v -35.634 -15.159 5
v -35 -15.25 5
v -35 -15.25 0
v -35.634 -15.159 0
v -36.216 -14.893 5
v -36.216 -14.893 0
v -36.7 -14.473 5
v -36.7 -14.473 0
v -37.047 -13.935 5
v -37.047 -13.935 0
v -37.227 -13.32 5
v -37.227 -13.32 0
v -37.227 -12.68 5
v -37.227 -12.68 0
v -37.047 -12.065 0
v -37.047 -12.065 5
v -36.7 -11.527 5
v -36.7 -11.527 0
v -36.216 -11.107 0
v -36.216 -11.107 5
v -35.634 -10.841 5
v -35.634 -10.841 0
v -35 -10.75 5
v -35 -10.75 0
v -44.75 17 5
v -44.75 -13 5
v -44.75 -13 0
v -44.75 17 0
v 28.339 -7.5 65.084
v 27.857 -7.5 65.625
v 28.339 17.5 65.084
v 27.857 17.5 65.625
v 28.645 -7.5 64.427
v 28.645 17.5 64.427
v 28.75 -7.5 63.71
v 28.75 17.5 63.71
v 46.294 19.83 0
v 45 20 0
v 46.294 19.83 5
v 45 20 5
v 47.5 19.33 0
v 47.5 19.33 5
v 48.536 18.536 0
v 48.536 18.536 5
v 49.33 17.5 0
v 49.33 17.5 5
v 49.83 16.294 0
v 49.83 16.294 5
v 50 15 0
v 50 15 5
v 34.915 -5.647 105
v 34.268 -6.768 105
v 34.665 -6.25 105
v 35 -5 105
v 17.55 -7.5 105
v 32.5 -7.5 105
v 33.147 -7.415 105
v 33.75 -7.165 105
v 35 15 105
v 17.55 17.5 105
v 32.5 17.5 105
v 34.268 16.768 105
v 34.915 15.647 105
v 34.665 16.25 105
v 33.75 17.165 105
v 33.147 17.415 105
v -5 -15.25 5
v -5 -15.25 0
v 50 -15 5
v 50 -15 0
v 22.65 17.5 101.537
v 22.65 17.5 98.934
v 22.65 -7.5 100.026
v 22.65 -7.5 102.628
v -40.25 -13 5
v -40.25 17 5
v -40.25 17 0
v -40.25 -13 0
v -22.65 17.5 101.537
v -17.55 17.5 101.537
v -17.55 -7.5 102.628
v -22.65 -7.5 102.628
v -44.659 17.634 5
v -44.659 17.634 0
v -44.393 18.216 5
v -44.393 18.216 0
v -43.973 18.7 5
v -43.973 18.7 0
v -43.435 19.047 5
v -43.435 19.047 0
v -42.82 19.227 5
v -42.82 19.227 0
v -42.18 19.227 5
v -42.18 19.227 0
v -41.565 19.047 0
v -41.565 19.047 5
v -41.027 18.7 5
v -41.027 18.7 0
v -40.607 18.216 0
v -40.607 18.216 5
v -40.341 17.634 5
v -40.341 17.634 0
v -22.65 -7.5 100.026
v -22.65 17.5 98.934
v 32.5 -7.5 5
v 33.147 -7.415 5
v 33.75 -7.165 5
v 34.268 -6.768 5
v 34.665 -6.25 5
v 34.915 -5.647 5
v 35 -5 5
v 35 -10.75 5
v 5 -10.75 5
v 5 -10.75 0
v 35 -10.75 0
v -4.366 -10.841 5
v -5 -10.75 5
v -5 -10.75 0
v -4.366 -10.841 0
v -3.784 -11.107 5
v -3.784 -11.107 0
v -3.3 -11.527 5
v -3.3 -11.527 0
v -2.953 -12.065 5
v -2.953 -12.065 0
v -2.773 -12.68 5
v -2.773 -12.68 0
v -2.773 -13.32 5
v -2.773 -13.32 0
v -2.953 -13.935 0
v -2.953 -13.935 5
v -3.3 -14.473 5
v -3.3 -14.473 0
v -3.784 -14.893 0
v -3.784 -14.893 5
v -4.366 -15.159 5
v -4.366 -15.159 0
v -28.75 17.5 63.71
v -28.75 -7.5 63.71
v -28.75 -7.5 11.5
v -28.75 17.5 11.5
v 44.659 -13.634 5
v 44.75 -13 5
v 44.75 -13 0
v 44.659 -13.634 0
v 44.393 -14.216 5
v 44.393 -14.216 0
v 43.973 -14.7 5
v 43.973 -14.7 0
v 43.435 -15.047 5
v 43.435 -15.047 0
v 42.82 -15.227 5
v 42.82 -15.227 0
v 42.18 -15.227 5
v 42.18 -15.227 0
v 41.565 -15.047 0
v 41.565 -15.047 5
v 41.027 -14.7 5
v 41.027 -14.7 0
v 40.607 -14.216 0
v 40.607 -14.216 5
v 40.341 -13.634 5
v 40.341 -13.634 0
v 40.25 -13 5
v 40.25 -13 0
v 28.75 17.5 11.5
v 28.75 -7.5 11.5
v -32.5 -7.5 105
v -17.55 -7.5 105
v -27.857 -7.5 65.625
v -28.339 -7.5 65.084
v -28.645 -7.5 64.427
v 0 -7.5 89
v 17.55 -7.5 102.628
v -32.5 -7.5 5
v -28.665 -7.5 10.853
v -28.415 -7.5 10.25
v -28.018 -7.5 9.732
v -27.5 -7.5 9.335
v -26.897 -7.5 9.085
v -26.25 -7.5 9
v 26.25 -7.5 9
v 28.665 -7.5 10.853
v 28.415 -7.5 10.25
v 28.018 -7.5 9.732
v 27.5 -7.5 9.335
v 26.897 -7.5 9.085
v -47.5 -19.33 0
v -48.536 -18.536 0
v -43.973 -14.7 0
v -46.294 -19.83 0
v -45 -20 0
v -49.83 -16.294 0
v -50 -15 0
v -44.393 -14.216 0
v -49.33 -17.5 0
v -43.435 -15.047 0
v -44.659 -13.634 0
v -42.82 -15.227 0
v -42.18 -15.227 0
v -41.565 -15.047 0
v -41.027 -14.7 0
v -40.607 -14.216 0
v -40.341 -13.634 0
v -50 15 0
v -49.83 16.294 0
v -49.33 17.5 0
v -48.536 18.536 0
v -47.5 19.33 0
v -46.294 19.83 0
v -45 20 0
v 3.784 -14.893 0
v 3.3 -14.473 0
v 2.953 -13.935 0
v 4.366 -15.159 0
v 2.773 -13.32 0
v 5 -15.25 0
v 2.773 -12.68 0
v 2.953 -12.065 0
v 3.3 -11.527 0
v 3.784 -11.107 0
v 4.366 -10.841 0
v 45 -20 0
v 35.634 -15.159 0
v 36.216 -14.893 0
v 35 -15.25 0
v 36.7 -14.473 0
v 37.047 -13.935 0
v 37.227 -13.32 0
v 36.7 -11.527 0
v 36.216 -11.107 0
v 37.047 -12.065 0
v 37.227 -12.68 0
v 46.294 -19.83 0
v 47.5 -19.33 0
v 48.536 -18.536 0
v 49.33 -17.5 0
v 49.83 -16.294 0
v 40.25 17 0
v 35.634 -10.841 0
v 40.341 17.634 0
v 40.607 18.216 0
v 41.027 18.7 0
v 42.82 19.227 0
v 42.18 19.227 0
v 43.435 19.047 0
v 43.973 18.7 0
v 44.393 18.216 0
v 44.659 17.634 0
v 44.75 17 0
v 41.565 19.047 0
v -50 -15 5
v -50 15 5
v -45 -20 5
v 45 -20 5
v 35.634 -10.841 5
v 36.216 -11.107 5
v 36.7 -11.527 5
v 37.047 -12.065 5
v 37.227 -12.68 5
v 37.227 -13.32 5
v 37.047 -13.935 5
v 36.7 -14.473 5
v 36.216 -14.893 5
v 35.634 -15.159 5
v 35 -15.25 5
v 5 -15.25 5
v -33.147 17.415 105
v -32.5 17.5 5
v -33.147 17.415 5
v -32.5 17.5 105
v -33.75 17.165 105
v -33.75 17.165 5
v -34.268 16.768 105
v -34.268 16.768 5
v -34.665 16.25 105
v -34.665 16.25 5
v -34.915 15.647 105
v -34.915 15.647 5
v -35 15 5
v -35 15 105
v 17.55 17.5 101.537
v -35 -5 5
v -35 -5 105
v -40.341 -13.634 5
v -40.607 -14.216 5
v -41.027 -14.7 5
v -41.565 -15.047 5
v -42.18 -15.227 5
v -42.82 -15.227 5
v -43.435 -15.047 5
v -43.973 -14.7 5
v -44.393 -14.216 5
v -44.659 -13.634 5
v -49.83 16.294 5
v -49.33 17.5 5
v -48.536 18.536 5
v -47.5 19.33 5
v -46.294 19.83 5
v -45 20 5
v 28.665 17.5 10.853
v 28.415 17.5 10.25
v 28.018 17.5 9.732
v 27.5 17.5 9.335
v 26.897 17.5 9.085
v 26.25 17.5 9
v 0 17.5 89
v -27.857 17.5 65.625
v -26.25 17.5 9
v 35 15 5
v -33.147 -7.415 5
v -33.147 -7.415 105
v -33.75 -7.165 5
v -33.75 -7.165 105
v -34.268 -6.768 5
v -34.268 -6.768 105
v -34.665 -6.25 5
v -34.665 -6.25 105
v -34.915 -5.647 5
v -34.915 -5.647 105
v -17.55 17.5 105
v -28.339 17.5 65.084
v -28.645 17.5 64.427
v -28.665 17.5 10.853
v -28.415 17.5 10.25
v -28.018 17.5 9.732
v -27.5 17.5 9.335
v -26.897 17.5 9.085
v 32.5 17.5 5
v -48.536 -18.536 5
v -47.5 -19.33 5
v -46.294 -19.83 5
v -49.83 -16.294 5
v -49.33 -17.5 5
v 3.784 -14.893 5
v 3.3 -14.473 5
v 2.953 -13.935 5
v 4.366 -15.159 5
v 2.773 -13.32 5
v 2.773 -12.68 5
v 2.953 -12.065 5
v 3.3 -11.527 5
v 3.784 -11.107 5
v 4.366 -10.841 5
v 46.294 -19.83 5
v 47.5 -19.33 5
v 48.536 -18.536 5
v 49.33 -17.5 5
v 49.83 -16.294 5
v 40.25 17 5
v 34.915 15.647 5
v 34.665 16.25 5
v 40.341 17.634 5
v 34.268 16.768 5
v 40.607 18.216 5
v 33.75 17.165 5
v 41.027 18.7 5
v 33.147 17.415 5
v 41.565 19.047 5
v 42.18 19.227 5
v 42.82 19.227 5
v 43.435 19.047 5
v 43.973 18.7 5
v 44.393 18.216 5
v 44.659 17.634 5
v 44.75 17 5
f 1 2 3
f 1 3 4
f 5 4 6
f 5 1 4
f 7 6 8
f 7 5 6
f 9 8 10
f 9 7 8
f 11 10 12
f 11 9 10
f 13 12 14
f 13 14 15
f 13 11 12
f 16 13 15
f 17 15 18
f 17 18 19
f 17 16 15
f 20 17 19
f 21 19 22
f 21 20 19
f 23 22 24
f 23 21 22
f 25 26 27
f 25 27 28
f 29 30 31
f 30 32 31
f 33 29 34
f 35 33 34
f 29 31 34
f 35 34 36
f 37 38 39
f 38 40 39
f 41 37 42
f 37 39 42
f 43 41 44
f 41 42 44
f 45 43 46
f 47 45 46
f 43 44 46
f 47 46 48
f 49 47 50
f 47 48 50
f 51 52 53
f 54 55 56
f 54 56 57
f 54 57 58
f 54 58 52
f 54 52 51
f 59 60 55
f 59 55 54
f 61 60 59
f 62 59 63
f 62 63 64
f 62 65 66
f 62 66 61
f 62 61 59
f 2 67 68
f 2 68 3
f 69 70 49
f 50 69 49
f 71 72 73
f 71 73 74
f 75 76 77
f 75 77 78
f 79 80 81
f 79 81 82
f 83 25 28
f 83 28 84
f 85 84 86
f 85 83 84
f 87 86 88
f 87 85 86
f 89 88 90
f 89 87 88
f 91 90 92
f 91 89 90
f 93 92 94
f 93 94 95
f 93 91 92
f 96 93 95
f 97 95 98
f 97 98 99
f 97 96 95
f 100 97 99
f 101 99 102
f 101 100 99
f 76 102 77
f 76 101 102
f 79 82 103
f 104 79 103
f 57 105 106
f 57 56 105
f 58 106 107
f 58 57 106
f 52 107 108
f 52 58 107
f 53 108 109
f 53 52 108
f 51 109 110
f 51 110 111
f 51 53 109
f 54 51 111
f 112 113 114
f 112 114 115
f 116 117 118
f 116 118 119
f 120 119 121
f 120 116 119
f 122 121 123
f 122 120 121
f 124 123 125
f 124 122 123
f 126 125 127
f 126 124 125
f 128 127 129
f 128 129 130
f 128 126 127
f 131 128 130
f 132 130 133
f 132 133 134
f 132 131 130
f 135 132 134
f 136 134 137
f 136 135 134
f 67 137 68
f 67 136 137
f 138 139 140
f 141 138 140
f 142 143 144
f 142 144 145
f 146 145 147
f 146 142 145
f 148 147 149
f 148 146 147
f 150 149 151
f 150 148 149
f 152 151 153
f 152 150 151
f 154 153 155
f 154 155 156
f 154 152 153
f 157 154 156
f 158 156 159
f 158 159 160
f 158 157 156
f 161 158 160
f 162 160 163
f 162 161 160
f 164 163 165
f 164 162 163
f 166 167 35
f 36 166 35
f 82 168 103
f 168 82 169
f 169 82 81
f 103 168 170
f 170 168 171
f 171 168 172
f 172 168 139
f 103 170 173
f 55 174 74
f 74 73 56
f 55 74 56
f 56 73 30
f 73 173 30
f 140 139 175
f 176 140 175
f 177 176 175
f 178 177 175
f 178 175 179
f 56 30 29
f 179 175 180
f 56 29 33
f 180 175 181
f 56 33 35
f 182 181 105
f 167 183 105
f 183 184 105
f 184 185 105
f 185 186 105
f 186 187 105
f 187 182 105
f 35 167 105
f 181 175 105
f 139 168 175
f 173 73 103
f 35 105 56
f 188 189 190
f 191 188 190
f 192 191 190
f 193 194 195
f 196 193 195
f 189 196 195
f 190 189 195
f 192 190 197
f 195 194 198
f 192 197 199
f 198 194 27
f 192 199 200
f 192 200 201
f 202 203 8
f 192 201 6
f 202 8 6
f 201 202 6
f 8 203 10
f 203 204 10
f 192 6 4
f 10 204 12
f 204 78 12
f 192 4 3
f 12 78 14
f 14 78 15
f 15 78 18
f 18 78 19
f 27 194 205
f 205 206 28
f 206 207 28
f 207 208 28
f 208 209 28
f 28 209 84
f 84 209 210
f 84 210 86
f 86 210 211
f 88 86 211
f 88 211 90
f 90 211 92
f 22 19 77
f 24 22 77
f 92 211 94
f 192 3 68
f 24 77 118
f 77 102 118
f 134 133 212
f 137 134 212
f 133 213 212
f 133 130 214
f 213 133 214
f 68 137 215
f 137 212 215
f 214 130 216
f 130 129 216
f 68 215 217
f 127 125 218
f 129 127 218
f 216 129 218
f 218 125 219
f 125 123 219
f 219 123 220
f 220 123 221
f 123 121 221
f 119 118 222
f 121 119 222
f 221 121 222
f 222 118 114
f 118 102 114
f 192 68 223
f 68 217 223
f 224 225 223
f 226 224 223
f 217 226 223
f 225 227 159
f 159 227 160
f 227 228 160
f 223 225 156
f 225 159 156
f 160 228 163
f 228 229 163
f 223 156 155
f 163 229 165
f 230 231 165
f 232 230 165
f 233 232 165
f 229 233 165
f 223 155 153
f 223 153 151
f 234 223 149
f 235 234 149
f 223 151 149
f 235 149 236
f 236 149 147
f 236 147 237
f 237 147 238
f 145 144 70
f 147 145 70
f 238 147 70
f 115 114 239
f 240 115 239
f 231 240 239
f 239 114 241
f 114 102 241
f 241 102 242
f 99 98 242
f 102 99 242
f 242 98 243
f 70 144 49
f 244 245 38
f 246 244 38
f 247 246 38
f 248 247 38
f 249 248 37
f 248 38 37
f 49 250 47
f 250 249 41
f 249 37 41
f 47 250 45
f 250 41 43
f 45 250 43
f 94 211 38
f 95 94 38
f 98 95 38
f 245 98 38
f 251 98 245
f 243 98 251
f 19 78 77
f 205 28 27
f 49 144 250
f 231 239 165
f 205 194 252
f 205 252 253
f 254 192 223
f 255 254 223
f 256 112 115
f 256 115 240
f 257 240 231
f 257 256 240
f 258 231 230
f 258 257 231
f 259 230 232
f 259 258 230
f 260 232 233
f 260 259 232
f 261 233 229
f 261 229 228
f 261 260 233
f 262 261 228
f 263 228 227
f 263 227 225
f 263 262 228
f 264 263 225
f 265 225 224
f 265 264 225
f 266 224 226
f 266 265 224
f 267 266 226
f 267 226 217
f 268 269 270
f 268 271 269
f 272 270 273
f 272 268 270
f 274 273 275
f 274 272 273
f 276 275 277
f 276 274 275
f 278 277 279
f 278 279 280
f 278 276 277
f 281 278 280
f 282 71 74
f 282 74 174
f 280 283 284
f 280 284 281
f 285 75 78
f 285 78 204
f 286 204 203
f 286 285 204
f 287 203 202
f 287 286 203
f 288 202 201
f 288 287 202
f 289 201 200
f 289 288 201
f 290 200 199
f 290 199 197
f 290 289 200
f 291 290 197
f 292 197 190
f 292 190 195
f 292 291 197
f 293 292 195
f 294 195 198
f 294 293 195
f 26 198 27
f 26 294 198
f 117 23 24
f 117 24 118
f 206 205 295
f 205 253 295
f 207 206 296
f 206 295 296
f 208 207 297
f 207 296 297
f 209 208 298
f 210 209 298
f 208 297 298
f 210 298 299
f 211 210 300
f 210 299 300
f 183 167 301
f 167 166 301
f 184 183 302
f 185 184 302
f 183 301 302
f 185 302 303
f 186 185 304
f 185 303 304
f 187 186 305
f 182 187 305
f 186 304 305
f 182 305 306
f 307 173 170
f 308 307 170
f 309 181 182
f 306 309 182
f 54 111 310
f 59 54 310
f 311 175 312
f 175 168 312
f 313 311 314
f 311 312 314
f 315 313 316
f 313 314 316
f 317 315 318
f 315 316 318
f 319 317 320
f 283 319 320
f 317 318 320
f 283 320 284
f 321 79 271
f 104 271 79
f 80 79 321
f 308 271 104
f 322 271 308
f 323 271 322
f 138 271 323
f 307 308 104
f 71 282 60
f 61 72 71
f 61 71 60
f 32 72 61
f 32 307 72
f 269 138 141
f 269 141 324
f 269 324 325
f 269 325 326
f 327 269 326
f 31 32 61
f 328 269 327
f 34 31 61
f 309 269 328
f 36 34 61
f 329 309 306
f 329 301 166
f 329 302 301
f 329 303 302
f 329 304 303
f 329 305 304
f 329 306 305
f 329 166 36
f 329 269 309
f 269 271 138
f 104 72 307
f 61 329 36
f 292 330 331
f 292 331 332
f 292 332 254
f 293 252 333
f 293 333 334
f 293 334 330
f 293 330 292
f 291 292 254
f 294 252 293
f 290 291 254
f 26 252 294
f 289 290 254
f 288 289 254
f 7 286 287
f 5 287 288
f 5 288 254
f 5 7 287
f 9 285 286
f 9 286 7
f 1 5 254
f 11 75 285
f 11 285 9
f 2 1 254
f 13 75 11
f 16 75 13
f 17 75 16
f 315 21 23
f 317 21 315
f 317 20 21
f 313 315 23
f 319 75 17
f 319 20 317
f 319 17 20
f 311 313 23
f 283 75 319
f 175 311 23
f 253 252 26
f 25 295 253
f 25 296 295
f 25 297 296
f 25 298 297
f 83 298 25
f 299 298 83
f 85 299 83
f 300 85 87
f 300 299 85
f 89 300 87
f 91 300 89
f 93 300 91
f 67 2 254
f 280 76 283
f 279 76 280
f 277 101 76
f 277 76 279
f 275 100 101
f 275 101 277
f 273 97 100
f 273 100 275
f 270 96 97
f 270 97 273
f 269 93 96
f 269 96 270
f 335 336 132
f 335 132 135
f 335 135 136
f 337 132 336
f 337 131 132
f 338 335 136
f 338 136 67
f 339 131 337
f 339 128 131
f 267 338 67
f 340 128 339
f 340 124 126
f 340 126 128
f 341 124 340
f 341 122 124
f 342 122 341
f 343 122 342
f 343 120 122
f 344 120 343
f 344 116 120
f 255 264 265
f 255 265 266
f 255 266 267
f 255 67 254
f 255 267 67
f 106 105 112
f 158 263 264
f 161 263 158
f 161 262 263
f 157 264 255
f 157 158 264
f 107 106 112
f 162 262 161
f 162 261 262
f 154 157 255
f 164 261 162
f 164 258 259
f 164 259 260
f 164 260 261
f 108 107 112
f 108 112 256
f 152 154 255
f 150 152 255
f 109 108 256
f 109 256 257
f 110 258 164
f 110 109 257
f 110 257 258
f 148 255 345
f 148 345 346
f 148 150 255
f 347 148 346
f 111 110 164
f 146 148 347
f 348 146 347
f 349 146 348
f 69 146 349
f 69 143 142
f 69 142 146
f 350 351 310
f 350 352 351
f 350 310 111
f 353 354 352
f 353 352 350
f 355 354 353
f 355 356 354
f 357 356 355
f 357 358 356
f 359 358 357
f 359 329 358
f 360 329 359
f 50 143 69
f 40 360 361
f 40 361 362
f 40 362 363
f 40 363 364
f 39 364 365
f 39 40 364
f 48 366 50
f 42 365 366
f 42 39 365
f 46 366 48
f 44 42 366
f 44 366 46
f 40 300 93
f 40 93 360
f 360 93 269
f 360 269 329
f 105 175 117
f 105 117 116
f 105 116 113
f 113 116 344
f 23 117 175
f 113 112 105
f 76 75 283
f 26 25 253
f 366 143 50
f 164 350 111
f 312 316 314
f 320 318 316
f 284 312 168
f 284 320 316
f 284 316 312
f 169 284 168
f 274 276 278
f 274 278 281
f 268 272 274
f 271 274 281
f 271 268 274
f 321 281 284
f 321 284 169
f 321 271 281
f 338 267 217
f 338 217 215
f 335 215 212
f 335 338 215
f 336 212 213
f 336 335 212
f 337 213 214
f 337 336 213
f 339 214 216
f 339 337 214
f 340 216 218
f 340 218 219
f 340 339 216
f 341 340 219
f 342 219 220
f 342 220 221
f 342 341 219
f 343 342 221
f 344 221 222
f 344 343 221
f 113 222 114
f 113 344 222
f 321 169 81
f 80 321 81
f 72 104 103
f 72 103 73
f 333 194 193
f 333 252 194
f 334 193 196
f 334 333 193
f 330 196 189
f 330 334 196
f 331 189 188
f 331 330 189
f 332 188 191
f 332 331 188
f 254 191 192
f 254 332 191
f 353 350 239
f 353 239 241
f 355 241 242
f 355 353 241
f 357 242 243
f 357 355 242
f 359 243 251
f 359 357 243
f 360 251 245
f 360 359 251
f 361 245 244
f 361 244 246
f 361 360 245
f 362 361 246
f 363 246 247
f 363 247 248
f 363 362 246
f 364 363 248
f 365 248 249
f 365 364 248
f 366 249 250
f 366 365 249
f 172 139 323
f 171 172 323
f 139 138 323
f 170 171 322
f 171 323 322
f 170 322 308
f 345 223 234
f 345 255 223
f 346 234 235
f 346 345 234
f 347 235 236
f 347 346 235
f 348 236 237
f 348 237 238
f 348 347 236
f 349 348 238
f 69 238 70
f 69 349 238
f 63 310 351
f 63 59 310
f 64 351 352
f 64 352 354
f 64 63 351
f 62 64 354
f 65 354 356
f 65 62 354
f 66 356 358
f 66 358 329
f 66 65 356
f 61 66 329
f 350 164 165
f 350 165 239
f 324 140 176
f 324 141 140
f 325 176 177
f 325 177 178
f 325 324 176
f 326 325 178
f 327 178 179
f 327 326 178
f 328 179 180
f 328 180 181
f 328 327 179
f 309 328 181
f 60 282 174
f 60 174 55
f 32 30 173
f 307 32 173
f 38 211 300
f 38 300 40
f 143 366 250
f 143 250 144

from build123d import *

# Parameters (mm, degrees)
SKETCH1_W               = 100
SKETCH1_H               = 40
BOSS_EXTRUDE1_DEPTH     = 5
CUT_EXTRUDE1_DEPTH      = 5
CUT_EXTRUDE2_DEPTH      = 5
CUT_EXTRUDE3_DEPTH      = 5
CUT_EXTRUDE4_DEPTH      = 5
SKETCH3_W               = 70
SKETCH3_H               = 25
BOSS_EXTRUDE2_DEPTH     = 100
FILLET1_R               = 5
FILLET2_R               = 2.5
CUT_EXTRUDE8_DEPTH      = 120.504184027
FILLET3_R               = 2.5
CUT_EXTRUDE9_DEPTH      = 122.347977614
CUT_EXTRUDE9_DEPTH_BACK = 122.347977614


with BuildPart() as part:
    # Sketch1 → Boss-Extrude1 (new body)
    with BuildSketch(Plane.XY):
        Rectangle(SKETCH1_W, SKETCH1_H)
    extrude(amount=BOSS_EXTRUDE1_DEPTH)

    # Sketch2 → Cut-Extrude1 (cut)
    with BuildSketch(Plane.XY.offset(5)):
        with BuildLine():
            Line((-40.25, 17), (-40.25, -13))
            ThreePointArc((-40.25, -13), (-42.5, -15.25), (-44.75, -13))
            Line((-44.75, -13), (-44.75, 17))
            ThreePointArc((-44.75, 17), (-42.5, 19.25), (-40.25, 17))
        make_face()
    extrude(amount=-CUT_EXTRUDE1_DEPTH, mode=Mode.SUBTRACT)

    # Sketch2<3> → Cut-Extrude2 (cut)
    with BuildSketch(Plane.XY.offset(5)):
        with BuildLine():
            Line((-35, -10.75), (-5, -10.75))
            ThreePointArc((-5, -10.75), (-2.75, -13), (-5, -15.25))
            Line((-5, -15.25), (-35, -15.25))
            ThreePointArc((-35, -15.25), (-37.25, -13), (-35, -10.75))
        make_face()
    extrude(amount=-CUT_EXTRUDE2_DEPTH, mode=Mode.SUBTRACT)

    # Sketch2<4> → Cut-Extrude3 (cut)
    with BuildSketch(Plane.XY.offset(5)):
        with BuildLine():
            Line((5, -10.75), (35, -10.75))
            ThreePointArc((35, -10.75), (37.25, -13), (35, -15.25))
            Line((35, -15.25), (5, -15.25))
            ThreePointArc((5, -15.25), (2.75, -13), (5, -10.75))
        make_face()
    extrude(amount=-CUT_EXTRUDE3_DEPTH, mode=Mode.SUBTRACT)

    # Sketch2<5> → Cut-Extrude4 (cut)
    with BuildSketch(Plane.XY.offset(5)):
        with BuildLine():
            Line((44.75, 17), (44.75, -13))
            ThreePointArc((44.75, -13), (42.5, -15.25), (40.25, -13))
            Line((40.25, -13), (40.25, 17))
            ThreePointArc((40.25, 17), (42.5, 19.25), (44.75, 17))
        make_face()
    extrude(amount=-CUT_EXTRUDE4_DEPTH, mode=Mode.SUBTRACT)

    # Sketch3 → Boss-Extrude2 (add)
    with BuildSketch(Plane.XY.offset(5)):
        with Locations((0, 5)):
            Rectangle(SKETCH3_W, SKETCH3_H)
    extrude(amount=BOSS_EXTRUDE2_DEPTH)

    # Fillet1
    fillet1_edges = [part.edges().sort_by_distance(p)[0] for p in [
        (-50, 20, 2.5),
        (50, 20, 2.5),
        (50, -20, 2.5),
        (-50, -20, 2.5),
    ]]
    fillet(fillet1_edges, radius=FILLET1_R)

    # Fillet2
    fillet2_edges = [part.edges().sort_by_distance(p)[0] for p in [
        (-35, 17.5, 55),
        (35, 17.5, 55),
        (35, -7.5, 55),
        (-35, -7.5, 55),
    ]]
    fillet(fillet2_edges, radius=FILLET2_R)

    # Sketch8 → Cut-Extrude8 (cut, through all)
    with BuildSketch(Plane.XZ.offset(7.5)):
        Polygon((-28.75, 9), (28.75, 9), (28.75, 64.875885604), (0, 89), (-28.75, 64.875885604), align=None)
    extrude(amount=-CUT_EXTRUDE8_DEPTH, mode=Mode.SUBTRACT)

    # Fillet3
    fillet3_edges = [part.edges().sort_by_distance(p)[0] for p in [
        (28.75, 5, 64.875885604),
        (-28.75, 5, 64.875885604),
        (28.75, 5, 9),
        (-28.75, 5, 9),
    ]]
    fillet(fillet3_edges, radius=FILLET3_R)

    # Sketch9 → Cut-Extrude9 (cut, two sides: drawn at the far end of the back side and taken through both)
    with BuildSketch(Plane(origin=(0, 12.891027114, -0.562834399), x_dir=(-1, 0, 0), z_dir=(0, 0.9990482215818578, -0.0436193873653361)).offset(-CUT_EXTRUDE9_DEPTH_BACK)):
        Polygon((17.55, 102.203377148), (22.65, 102.203377148), (22.65, 99.603377148), (-22.65, 99.603377148), (-22.65, 102.203377148), (-17.55, 102.203377148), (-17.55, 108.905331005), (17.55, 108.905331005), align=None)
    extrude(amount=CUT_EXTRUDE9_DEPTH + CUT_EXTRUDE9_DEPTH_BACK, mode=Mode.SUBTRACT)


solid = part.part
